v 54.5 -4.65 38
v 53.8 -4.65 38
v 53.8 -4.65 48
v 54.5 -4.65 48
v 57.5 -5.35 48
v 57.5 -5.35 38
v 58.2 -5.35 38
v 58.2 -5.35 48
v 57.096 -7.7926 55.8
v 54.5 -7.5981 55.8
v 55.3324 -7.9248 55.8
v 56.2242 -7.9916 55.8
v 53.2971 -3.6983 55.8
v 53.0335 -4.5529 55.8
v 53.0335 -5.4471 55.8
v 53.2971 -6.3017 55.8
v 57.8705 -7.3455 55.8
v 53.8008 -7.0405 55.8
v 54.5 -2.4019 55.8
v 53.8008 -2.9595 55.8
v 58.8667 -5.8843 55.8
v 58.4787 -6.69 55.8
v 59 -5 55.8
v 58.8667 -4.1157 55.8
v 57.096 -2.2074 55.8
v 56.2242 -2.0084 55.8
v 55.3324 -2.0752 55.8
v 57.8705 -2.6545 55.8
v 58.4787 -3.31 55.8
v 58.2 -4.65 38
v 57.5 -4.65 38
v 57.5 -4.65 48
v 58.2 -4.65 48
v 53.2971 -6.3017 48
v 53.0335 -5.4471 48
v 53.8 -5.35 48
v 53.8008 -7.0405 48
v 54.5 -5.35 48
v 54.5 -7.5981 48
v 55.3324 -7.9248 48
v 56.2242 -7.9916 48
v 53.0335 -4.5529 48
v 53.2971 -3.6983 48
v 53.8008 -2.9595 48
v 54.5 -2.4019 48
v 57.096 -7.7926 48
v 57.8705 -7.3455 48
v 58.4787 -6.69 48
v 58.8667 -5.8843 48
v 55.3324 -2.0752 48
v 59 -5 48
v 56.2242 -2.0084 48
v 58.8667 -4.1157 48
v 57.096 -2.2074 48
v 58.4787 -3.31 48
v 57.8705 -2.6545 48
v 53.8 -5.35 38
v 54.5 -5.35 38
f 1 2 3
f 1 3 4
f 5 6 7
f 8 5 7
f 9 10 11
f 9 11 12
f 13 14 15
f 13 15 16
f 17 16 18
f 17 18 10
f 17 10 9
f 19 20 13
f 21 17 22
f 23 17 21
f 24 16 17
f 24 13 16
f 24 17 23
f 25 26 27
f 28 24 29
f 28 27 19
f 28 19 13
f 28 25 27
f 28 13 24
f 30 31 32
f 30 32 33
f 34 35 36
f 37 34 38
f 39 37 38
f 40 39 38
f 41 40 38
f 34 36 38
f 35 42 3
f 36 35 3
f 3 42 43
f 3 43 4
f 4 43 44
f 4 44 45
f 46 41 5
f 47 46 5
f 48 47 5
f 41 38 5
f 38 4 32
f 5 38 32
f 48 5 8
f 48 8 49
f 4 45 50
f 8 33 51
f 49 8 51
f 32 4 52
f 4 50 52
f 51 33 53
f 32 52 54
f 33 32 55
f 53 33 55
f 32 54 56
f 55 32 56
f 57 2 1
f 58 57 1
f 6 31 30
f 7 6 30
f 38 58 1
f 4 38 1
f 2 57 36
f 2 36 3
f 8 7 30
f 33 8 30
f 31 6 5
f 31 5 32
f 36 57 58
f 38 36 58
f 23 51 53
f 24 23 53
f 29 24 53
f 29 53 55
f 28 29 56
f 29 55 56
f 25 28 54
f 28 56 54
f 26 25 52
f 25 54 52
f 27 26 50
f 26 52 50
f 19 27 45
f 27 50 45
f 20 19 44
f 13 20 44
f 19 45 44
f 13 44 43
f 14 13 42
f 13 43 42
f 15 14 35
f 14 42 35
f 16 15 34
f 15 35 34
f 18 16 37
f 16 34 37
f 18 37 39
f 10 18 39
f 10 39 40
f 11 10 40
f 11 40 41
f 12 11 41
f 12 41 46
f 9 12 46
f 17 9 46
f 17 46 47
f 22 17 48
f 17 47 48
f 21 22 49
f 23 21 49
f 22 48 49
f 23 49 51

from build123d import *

# Parameters (mm, degrees)
SKETCH021_W           = 0.7
SKETCH021_H           = 0.7
PAD010002001013_DEPTH = 10
SKETCH020_R           = 3
PAD010002001012_DEPTH = 7.8


with BuildPart() as pad010002001013:
    # Sketch021 → Pad010002001013 (new body)
    with BuildSketch(Plane.XY):
        with Locations((-1.85, 0)):
            Rectangle(SKETCH021_W, SKETCH021_H)
        with Locations((1.85, 0)):
            Rectangle(SKETCH021_W, SKETCH021_H)
    extrude(amount=PAD010002001013_DEPTH)


with BuildPart() as countled:
    # Sketch020 → Pad010002001012 (new body)
    with BuildSketch(Plane.XY.offset(10)):
        Circle(SKETCH020_R)
    extrude(amount=PAD010002001012_DEPTH)

    # Fusion008: union Pad010002001013
    add(pad010002001013.part)


with BuildPart() as countled_1:
    # Fusion008 placement: moved
    add(countled.part.moved(Location((56, -5, 38))))


solid = countled_1.part
